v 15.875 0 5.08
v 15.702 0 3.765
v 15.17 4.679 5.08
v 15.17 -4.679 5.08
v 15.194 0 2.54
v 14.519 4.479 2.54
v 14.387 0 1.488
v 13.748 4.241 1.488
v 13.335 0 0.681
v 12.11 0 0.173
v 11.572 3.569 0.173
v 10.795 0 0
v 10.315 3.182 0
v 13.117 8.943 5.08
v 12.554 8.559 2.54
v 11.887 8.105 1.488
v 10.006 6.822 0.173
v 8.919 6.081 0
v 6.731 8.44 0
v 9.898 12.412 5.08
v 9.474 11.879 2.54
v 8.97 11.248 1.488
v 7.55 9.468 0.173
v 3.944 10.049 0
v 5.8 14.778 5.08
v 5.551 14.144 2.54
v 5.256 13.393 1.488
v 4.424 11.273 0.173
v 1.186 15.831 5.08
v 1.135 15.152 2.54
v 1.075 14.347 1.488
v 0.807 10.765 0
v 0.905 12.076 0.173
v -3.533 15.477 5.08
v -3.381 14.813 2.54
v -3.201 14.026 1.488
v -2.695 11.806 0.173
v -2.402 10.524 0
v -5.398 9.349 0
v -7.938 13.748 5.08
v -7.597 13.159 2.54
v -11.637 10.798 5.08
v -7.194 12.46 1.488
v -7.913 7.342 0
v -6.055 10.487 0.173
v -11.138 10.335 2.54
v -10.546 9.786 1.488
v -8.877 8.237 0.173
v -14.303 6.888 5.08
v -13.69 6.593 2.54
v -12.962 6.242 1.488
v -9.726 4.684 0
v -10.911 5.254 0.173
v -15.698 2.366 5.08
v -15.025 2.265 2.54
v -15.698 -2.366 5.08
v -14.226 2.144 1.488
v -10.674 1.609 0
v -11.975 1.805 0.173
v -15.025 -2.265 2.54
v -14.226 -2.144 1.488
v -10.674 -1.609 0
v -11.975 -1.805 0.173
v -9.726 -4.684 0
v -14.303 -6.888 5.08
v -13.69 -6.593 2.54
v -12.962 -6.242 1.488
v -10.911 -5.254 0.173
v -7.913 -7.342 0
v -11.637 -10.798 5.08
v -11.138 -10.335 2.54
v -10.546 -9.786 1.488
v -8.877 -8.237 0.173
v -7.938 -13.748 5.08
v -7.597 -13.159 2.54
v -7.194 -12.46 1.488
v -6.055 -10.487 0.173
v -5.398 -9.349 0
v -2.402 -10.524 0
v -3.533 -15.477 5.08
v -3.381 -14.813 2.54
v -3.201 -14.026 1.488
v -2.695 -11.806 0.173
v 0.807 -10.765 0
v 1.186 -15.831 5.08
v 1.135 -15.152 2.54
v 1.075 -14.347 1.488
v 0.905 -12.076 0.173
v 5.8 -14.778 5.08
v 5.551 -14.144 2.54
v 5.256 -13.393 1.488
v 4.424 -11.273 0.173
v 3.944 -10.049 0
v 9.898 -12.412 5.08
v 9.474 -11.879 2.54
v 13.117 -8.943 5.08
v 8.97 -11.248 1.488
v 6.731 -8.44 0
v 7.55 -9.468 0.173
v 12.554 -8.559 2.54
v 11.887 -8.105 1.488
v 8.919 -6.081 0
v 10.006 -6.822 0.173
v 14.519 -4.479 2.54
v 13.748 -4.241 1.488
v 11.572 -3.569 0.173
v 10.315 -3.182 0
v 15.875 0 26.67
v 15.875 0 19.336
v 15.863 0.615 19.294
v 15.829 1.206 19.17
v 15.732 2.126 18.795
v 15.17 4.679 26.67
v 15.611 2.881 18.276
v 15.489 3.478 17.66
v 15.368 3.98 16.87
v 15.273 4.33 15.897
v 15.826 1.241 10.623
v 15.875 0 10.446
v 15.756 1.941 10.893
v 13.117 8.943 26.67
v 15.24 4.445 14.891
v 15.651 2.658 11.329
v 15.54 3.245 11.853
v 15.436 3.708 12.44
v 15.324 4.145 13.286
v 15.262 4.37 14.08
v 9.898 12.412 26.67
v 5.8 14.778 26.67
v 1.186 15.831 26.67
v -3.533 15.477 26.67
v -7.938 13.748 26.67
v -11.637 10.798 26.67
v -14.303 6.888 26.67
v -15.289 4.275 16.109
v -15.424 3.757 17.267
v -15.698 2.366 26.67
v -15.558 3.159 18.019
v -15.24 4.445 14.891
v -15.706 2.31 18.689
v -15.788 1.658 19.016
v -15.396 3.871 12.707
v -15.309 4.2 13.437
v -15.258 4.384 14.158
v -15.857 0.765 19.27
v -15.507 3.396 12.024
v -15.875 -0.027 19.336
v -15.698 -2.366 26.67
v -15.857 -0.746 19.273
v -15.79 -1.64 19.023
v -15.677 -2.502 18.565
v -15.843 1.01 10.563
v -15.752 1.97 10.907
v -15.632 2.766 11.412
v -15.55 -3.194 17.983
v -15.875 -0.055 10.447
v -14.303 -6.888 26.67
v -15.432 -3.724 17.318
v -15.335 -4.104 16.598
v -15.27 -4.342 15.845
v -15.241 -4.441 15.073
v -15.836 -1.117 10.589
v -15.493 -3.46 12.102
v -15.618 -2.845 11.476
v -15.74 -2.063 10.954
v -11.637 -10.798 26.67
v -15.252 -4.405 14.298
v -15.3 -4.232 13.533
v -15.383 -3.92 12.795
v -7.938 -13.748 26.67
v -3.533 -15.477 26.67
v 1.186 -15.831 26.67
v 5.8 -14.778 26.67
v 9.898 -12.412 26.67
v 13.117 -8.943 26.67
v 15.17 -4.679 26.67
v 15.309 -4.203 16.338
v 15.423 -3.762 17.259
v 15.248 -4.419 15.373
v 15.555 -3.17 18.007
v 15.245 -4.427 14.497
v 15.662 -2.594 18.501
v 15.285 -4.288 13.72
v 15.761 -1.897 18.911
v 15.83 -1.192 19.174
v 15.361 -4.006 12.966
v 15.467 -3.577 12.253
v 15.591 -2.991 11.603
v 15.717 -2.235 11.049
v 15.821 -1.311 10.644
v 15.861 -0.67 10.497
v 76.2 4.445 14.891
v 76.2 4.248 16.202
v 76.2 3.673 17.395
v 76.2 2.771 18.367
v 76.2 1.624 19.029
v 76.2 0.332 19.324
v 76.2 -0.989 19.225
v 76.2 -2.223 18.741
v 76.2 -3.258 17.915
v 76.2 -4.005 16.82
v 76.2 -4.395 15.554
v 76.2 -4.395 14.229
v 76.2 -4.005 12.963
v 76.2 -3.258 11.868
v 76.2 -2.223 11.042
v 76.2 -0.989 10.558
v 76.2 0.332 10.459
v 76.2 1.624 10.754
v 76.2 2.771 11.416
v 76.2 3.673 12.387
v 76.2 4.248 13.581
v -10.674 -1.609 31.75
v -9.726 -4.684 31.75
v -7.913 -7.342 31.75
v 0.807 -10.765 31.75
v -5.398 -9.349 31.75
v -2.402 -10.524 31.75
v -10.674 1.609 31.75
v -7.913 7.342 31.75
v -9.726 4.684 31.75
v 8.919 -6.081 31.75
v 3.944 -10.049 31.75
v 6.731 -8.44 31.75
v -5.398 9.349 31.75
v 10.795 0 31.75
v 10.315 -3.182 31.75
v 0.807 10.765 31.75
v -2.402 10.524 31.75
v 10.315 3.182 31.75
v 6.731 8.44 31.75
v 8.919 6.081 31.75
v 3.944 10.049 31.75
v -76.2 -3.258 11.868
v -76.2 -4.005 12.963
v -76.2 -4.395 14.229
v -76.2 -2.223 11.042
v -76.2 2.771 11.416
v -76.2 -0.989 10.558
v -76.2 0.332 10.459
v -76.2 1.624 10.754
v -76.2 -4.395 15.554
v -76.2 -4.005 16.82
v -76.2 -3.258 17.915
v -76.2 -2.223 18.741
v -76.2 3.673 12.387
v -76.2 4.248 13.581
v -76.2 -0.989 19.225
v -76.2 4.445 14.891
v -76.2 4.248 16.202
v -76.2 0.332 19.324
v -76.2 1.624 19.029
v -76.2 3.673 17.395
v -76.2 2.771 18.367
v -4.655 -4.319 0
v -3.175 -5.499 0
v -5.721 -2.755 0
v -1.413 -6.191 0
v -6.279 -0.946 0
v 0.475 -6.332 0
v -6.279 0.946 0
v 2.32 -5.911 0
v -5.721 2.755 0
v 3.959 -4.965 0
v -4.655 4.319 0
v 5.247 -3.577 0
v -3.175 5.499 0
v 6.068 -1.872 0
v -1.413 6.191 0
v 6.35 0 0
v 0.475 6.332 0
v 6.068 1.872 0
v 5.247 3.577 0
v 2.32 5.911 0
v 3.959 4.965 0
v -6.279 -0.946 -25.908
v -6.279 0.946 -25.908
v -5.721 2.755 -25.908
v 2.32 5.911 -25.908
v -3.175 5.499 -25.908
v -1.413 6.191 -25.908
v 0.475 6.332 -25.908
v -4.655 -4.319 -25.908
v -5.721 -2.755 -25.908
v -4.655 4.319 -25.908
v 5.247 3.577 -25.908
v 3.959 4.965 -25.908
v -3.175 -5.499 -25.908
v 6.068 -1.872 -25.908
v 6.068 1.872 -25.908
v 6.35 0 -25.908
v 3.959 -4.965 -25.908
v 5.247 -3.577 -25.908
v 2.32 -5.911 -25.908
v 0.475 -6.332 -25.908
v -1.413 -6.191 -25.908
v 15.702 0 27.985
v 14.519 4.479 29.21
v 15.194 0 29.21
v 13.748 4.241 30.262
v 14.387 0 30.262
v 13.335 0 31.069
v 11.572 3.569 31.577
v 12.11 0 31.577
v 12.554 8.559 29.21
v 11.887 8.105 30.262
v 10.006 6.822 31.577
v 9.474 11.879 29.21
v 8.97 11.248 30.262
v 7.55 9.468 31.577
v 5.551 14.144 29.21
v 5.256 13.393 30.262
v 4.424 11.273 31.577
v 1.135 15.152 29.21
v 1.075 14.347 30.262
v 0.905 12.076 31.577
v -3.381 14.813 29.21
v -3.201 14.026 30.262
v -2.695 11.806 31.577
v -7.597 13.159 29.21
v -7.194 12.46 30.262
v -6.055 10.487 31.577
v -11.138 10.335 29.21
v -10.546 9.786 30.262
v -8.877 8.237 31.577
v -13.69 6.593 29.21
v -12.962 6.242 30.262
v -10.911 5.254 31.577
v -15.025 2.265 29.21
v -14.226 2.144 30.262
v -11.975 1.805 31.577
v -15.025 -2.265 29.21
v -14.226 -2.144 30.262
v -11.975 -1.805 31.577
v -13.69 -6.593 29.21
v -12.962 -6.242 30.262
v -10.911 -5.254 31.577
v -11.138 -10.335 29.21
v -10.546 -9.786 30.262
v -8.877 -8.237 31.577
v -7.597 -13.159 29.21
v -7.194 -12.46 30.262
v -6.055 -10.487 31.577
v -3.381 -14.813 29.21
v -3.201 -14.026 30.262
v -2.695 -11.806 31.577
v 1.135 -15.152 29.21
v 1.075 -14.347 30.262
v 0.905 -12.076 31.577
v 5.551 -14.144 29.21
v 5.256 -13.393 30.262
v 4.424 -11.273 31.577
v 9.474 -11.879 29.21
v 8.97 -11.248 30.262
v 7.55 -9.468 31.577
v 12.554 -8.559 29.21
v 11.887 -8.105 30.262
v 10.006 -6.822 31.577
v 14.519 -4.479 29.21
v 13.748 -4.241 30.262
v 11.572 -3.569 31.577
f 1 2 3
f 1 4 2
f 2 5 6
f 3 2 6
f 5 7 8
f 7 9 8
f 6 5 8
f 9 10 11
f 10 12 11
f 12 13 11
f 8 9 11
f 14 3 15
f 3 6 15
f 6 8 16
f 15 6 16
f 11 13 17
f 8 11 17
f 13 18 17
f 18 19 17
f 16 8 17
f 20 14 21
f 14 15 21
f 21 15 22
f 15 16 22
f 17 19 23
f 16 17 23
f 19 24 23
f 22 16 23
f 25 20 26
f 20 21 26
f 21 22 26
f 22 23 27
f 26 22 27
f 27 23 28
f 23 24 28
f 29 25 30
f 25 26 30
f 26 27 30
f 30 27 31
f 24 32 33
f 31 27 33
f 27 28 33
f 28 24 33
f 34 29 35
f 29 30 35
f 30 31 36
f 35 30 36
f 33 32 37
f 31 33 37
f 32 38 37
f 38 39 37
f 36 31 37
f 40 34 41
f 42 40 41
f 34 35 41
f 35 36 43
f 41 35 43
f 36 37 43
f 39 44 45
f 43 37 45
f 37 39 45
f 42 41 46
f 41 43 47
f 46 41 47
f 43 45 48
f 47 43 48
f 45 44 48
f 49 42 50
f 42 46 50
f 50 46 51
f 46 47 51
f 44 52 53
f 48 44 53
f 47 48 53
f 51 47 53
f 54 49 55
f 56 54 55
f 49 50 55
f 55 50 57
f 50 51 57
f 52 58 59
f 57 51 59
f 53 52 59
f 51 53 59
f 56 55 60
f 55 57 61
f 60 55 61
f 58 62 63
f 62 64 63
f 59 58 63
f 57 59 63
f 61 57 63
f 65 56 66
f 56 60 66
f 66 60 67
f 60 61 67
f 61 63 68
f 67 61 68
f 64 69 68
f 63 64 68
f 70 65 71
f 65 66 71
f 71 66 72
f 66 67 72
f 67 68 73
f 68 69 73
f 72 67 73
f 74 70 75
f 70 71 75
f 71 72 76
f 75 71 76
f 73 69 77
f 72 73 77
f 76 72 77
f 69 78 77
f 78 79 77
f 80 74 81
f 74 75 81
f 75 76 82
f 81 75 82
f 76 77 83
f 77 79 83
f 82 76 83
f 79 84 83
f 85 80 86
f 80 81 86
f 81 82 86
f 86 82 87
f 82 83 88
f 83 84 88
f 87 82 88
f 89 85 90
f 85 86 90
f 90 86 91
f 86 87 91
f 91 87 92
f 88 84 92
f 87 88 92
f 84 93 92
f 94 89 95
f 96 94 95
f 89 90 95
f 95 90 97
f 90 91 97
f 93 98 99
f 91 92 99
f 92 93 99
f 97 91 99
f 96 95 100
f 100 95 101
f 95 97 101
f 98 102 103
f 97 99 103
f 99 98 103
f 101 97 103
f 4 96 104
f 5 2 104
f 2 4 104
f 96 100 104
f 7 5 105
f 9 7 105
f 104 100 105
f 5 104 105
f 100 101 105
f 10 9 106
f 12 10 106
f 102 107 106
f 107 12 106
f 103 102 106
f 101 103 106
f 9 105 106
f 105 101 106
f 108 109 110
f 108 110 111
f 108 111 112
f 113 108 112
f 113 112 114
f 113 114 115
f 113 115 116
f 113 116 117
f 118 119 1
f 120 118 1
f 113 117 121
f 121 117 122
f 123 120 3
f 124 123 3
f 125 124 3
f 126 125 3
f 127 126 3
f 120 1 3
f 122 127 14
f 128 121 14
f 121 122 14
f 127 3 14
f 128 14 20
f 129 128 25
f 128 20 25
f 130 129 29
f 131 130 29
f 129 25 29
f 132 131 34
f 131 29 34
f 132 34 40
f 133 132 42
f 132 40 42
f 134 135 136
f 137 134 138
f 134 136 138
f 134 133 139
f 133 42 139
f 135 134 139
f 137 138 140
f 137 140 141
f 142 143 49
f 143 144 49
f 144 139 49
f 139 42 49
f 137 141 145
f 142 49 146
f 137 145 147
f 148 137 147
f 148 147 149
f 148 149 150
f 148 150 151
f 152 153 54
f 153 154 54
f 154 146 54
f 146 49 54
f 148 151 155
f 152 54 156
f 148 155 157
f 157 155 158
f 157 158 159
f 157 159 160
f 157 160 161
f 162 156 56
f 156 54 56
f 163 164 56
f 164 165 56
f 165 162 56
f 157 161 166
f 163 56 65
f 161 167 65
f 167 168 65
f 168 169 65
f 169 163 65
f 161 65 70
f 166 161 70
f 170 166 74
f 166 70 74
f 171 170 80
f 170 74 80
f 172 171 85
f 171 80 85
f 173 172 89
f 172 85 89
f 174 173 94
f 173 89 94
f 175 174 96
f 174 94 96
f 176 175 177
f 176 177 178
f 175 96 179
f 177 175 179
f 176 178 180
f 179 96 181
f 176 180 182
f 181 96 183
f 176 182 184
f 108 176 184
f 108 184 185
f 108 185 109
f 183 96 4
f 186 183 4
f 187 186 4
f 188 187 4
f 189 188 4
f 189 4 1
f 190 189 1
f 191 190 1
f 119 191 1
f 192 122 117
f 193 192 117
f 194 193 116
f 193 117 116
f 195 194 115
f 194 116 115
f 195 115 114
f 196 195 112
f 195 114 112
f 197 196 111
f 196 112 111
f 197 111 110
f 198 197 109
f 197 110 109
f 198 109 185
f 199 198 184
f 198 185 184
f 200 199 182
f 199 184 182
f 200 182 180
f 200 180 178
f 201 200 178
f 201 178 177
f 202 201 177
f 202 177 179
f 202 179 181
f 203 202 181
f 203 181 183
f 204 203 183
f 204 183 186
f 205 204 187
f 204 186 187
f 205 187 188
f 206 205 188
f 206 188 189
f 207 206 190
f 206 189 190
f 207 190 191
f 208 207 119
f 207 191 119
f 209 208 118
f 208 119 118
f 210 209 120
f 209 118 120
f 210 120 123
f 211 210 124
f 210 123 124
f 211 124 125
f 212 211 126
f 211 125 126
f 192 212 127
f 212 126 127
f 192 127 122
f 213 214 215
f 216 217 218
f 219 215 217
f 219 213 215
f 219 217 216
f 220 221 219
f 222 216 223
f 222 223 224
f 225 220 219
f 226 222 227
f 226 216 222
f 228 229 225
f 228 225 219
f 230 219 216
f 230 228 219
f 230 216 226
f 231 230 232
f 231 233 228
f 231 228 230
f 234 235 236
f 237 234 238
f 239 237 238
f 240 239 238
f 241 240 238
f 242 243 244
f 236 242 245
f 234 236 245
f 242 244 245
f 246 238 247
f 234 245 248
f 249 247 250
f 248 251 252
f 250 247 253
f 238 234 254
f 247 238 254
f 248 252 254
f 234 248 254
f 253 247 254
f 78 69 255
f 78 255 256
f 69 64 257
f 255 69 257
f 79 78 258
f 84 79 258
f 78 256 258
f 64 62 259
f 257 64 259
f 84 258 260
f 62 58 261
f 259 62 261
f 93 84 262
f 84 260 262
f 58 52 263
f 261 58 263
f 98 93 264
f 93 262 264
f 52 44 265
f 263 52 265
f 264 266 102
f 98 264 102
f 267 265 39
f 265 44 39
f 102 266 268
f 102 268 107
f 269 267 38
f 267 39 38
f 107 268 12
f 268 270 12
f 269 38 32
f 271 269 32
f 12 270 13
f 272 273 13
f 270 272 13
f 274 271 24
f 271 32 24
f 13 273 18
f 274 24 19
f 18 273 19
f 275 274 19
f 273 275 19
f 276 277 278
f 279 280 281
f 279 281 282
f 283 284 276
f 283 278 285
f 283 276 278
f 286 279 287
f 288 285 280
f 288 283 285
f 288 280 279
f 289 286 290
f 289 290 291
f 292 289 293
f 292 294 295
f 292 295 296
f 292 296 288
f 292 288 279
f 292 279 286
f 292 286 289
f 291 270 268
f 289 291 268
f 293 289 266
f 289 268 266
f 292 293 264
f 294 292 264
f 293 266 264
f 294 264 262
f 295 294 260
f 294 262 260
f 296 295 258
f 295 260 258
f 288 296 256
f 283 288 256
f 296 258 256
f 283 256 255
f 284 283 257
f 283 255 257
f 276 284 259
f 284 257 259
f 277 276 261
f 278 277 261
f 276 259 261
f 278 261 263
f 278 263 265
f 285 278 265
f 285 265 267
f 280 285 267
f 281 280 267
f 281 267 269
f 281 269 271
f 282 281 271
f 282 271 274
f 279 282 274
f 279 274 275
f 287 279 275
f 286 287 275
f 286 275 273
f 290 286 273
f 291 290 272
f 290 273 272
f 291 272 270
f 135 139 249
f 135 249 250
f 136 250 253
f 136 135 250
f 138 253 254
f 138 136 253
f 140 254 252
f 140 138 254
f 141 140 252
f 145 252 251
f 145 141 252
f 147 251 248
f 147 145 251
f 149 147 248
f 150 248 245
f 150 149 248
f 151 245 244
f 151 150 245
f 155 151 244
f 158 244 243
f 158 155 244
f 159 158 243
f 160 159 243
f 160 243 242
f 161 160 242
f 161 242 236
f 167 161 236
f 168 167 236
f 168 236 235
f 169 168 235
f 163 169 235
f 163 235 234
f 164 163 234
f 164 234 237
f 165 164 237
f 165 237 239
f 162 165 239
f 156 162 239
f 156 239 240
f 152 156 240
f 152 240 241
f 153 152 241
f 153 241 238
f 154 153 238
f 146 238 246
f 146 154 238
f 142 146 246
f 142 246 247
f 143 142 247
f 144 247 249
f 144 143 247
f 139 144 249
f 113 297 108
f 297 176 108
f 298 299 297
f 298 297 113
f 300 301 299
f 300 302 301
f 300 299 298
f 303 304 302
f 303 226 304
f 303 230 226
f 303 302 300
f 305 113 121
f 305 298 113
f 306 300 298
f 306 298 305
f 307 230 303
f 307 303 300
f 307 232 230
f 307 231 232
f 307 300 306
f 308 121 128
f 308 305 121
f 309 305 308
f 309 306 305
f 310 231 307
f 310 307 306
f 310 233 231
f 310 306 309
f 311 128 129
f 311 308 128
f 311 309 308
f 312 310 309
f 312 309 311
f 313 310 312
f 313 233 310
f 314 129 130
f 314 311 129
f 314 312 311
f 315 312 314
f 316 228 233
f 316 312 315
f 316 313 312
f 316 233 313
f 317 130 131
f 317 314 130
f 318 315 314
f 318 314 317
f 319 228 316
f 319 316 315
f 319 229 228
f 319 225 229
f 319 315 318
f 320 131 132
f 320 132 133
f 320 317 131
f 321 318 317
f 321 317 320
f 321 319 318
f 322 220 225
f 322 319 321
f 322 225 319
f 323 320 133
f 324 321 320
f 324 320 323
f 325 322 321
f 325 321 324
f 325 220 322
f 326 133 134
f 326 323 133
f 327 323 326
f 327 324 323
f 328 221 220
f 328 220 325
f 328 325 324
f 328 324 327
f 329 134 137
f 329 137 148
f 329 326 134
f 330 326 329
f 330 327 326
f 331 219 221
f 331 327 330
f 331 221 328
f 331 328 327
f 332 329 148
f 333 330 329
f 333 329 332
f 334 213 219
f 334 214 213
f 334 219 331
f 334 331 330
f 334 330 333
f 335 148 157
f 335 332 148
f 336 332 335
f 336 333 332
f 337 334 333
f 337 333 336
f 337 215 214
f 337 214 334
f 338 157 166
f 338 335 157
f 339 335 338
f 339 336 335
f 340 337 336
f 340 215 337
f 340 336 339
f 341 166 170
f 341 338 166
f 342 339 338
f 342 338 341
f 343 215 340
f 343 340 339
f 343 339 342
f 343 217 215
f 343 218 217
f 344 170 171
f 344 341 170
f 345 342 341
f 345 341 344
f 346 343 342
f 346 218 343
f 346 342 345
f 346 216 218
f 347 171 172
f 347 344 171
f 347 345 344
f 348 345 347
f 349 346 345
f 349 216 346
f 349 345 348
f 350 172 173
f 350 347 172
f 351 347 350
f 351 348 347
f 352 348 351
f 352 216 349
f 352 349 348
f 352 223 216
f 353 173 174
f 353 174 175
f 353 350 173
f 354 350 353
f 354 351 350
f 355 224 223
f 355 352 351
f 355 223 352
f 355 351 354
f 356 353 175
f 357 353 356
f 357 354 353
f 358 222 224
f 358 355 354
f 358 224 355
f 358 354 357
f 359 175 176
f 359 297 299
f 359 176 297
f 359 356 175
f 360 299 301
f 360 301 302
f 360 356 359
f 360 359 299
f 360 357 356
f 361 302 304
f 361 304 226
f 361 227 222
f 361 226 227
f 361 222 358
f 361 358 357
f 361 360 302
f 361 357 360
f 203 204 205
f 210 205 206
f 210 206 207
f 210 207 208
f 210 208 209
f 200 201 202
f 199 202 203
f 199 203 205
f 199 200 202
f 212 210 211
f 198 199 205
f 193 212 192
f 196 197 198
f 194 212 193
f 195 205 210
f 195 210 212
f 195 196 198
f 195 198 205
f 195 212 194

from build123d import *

# Parameters (mm, degrees)
F0_R     = 15.875
F1_DEPTH = 31.75
F2_R     = 4.445
F3_DEPTH = 76.2
F4_R     = 4.445
F5_DEPTH = 76.2
F6_R     = 6.35
F7_DEPTH = 25.908
F8_R     = 5.08


with BuildPart() as f1:
    # F0 (on Top) → F1 (new body)
    with BuildSketch(Plane.XY):
        Circle(F0_R)
    extrude(amount=F1_DEPTH)

    # F2 (on Right) → F3 (join)
    with BuildSketch(Plane.YZ):
        with Locations((0, 14.891451)):
            Circle(F2_R)
    extrude(amount=F3_DEPTH)

    # F4 (on Right) → F5 (join)
    with BuildSketch(Plane.YZ):
        with Locations((0, 14.891451)):
            Circle(F4_R)
    extrude(amount=-F5_DEPTH)

    # F6 (on face) → F7 (join)
    with BuildSketch(Plane(origin=(0, 0, 0), x_dir=(1, 0, 0), z_dir=(0, 0, -1))):
        Circle(F6_R)
    extrude(amount=F7_DEPTH)

    # F8
    f8_edges = [f1.edges().sort_by_distance(p)[0] for p in [
        (-15.875, 0, 31.75),
        (-15.875, 0, 0),
    ]]
    fillet(f8_edges, radius=F8_R)


solid = f1.part
